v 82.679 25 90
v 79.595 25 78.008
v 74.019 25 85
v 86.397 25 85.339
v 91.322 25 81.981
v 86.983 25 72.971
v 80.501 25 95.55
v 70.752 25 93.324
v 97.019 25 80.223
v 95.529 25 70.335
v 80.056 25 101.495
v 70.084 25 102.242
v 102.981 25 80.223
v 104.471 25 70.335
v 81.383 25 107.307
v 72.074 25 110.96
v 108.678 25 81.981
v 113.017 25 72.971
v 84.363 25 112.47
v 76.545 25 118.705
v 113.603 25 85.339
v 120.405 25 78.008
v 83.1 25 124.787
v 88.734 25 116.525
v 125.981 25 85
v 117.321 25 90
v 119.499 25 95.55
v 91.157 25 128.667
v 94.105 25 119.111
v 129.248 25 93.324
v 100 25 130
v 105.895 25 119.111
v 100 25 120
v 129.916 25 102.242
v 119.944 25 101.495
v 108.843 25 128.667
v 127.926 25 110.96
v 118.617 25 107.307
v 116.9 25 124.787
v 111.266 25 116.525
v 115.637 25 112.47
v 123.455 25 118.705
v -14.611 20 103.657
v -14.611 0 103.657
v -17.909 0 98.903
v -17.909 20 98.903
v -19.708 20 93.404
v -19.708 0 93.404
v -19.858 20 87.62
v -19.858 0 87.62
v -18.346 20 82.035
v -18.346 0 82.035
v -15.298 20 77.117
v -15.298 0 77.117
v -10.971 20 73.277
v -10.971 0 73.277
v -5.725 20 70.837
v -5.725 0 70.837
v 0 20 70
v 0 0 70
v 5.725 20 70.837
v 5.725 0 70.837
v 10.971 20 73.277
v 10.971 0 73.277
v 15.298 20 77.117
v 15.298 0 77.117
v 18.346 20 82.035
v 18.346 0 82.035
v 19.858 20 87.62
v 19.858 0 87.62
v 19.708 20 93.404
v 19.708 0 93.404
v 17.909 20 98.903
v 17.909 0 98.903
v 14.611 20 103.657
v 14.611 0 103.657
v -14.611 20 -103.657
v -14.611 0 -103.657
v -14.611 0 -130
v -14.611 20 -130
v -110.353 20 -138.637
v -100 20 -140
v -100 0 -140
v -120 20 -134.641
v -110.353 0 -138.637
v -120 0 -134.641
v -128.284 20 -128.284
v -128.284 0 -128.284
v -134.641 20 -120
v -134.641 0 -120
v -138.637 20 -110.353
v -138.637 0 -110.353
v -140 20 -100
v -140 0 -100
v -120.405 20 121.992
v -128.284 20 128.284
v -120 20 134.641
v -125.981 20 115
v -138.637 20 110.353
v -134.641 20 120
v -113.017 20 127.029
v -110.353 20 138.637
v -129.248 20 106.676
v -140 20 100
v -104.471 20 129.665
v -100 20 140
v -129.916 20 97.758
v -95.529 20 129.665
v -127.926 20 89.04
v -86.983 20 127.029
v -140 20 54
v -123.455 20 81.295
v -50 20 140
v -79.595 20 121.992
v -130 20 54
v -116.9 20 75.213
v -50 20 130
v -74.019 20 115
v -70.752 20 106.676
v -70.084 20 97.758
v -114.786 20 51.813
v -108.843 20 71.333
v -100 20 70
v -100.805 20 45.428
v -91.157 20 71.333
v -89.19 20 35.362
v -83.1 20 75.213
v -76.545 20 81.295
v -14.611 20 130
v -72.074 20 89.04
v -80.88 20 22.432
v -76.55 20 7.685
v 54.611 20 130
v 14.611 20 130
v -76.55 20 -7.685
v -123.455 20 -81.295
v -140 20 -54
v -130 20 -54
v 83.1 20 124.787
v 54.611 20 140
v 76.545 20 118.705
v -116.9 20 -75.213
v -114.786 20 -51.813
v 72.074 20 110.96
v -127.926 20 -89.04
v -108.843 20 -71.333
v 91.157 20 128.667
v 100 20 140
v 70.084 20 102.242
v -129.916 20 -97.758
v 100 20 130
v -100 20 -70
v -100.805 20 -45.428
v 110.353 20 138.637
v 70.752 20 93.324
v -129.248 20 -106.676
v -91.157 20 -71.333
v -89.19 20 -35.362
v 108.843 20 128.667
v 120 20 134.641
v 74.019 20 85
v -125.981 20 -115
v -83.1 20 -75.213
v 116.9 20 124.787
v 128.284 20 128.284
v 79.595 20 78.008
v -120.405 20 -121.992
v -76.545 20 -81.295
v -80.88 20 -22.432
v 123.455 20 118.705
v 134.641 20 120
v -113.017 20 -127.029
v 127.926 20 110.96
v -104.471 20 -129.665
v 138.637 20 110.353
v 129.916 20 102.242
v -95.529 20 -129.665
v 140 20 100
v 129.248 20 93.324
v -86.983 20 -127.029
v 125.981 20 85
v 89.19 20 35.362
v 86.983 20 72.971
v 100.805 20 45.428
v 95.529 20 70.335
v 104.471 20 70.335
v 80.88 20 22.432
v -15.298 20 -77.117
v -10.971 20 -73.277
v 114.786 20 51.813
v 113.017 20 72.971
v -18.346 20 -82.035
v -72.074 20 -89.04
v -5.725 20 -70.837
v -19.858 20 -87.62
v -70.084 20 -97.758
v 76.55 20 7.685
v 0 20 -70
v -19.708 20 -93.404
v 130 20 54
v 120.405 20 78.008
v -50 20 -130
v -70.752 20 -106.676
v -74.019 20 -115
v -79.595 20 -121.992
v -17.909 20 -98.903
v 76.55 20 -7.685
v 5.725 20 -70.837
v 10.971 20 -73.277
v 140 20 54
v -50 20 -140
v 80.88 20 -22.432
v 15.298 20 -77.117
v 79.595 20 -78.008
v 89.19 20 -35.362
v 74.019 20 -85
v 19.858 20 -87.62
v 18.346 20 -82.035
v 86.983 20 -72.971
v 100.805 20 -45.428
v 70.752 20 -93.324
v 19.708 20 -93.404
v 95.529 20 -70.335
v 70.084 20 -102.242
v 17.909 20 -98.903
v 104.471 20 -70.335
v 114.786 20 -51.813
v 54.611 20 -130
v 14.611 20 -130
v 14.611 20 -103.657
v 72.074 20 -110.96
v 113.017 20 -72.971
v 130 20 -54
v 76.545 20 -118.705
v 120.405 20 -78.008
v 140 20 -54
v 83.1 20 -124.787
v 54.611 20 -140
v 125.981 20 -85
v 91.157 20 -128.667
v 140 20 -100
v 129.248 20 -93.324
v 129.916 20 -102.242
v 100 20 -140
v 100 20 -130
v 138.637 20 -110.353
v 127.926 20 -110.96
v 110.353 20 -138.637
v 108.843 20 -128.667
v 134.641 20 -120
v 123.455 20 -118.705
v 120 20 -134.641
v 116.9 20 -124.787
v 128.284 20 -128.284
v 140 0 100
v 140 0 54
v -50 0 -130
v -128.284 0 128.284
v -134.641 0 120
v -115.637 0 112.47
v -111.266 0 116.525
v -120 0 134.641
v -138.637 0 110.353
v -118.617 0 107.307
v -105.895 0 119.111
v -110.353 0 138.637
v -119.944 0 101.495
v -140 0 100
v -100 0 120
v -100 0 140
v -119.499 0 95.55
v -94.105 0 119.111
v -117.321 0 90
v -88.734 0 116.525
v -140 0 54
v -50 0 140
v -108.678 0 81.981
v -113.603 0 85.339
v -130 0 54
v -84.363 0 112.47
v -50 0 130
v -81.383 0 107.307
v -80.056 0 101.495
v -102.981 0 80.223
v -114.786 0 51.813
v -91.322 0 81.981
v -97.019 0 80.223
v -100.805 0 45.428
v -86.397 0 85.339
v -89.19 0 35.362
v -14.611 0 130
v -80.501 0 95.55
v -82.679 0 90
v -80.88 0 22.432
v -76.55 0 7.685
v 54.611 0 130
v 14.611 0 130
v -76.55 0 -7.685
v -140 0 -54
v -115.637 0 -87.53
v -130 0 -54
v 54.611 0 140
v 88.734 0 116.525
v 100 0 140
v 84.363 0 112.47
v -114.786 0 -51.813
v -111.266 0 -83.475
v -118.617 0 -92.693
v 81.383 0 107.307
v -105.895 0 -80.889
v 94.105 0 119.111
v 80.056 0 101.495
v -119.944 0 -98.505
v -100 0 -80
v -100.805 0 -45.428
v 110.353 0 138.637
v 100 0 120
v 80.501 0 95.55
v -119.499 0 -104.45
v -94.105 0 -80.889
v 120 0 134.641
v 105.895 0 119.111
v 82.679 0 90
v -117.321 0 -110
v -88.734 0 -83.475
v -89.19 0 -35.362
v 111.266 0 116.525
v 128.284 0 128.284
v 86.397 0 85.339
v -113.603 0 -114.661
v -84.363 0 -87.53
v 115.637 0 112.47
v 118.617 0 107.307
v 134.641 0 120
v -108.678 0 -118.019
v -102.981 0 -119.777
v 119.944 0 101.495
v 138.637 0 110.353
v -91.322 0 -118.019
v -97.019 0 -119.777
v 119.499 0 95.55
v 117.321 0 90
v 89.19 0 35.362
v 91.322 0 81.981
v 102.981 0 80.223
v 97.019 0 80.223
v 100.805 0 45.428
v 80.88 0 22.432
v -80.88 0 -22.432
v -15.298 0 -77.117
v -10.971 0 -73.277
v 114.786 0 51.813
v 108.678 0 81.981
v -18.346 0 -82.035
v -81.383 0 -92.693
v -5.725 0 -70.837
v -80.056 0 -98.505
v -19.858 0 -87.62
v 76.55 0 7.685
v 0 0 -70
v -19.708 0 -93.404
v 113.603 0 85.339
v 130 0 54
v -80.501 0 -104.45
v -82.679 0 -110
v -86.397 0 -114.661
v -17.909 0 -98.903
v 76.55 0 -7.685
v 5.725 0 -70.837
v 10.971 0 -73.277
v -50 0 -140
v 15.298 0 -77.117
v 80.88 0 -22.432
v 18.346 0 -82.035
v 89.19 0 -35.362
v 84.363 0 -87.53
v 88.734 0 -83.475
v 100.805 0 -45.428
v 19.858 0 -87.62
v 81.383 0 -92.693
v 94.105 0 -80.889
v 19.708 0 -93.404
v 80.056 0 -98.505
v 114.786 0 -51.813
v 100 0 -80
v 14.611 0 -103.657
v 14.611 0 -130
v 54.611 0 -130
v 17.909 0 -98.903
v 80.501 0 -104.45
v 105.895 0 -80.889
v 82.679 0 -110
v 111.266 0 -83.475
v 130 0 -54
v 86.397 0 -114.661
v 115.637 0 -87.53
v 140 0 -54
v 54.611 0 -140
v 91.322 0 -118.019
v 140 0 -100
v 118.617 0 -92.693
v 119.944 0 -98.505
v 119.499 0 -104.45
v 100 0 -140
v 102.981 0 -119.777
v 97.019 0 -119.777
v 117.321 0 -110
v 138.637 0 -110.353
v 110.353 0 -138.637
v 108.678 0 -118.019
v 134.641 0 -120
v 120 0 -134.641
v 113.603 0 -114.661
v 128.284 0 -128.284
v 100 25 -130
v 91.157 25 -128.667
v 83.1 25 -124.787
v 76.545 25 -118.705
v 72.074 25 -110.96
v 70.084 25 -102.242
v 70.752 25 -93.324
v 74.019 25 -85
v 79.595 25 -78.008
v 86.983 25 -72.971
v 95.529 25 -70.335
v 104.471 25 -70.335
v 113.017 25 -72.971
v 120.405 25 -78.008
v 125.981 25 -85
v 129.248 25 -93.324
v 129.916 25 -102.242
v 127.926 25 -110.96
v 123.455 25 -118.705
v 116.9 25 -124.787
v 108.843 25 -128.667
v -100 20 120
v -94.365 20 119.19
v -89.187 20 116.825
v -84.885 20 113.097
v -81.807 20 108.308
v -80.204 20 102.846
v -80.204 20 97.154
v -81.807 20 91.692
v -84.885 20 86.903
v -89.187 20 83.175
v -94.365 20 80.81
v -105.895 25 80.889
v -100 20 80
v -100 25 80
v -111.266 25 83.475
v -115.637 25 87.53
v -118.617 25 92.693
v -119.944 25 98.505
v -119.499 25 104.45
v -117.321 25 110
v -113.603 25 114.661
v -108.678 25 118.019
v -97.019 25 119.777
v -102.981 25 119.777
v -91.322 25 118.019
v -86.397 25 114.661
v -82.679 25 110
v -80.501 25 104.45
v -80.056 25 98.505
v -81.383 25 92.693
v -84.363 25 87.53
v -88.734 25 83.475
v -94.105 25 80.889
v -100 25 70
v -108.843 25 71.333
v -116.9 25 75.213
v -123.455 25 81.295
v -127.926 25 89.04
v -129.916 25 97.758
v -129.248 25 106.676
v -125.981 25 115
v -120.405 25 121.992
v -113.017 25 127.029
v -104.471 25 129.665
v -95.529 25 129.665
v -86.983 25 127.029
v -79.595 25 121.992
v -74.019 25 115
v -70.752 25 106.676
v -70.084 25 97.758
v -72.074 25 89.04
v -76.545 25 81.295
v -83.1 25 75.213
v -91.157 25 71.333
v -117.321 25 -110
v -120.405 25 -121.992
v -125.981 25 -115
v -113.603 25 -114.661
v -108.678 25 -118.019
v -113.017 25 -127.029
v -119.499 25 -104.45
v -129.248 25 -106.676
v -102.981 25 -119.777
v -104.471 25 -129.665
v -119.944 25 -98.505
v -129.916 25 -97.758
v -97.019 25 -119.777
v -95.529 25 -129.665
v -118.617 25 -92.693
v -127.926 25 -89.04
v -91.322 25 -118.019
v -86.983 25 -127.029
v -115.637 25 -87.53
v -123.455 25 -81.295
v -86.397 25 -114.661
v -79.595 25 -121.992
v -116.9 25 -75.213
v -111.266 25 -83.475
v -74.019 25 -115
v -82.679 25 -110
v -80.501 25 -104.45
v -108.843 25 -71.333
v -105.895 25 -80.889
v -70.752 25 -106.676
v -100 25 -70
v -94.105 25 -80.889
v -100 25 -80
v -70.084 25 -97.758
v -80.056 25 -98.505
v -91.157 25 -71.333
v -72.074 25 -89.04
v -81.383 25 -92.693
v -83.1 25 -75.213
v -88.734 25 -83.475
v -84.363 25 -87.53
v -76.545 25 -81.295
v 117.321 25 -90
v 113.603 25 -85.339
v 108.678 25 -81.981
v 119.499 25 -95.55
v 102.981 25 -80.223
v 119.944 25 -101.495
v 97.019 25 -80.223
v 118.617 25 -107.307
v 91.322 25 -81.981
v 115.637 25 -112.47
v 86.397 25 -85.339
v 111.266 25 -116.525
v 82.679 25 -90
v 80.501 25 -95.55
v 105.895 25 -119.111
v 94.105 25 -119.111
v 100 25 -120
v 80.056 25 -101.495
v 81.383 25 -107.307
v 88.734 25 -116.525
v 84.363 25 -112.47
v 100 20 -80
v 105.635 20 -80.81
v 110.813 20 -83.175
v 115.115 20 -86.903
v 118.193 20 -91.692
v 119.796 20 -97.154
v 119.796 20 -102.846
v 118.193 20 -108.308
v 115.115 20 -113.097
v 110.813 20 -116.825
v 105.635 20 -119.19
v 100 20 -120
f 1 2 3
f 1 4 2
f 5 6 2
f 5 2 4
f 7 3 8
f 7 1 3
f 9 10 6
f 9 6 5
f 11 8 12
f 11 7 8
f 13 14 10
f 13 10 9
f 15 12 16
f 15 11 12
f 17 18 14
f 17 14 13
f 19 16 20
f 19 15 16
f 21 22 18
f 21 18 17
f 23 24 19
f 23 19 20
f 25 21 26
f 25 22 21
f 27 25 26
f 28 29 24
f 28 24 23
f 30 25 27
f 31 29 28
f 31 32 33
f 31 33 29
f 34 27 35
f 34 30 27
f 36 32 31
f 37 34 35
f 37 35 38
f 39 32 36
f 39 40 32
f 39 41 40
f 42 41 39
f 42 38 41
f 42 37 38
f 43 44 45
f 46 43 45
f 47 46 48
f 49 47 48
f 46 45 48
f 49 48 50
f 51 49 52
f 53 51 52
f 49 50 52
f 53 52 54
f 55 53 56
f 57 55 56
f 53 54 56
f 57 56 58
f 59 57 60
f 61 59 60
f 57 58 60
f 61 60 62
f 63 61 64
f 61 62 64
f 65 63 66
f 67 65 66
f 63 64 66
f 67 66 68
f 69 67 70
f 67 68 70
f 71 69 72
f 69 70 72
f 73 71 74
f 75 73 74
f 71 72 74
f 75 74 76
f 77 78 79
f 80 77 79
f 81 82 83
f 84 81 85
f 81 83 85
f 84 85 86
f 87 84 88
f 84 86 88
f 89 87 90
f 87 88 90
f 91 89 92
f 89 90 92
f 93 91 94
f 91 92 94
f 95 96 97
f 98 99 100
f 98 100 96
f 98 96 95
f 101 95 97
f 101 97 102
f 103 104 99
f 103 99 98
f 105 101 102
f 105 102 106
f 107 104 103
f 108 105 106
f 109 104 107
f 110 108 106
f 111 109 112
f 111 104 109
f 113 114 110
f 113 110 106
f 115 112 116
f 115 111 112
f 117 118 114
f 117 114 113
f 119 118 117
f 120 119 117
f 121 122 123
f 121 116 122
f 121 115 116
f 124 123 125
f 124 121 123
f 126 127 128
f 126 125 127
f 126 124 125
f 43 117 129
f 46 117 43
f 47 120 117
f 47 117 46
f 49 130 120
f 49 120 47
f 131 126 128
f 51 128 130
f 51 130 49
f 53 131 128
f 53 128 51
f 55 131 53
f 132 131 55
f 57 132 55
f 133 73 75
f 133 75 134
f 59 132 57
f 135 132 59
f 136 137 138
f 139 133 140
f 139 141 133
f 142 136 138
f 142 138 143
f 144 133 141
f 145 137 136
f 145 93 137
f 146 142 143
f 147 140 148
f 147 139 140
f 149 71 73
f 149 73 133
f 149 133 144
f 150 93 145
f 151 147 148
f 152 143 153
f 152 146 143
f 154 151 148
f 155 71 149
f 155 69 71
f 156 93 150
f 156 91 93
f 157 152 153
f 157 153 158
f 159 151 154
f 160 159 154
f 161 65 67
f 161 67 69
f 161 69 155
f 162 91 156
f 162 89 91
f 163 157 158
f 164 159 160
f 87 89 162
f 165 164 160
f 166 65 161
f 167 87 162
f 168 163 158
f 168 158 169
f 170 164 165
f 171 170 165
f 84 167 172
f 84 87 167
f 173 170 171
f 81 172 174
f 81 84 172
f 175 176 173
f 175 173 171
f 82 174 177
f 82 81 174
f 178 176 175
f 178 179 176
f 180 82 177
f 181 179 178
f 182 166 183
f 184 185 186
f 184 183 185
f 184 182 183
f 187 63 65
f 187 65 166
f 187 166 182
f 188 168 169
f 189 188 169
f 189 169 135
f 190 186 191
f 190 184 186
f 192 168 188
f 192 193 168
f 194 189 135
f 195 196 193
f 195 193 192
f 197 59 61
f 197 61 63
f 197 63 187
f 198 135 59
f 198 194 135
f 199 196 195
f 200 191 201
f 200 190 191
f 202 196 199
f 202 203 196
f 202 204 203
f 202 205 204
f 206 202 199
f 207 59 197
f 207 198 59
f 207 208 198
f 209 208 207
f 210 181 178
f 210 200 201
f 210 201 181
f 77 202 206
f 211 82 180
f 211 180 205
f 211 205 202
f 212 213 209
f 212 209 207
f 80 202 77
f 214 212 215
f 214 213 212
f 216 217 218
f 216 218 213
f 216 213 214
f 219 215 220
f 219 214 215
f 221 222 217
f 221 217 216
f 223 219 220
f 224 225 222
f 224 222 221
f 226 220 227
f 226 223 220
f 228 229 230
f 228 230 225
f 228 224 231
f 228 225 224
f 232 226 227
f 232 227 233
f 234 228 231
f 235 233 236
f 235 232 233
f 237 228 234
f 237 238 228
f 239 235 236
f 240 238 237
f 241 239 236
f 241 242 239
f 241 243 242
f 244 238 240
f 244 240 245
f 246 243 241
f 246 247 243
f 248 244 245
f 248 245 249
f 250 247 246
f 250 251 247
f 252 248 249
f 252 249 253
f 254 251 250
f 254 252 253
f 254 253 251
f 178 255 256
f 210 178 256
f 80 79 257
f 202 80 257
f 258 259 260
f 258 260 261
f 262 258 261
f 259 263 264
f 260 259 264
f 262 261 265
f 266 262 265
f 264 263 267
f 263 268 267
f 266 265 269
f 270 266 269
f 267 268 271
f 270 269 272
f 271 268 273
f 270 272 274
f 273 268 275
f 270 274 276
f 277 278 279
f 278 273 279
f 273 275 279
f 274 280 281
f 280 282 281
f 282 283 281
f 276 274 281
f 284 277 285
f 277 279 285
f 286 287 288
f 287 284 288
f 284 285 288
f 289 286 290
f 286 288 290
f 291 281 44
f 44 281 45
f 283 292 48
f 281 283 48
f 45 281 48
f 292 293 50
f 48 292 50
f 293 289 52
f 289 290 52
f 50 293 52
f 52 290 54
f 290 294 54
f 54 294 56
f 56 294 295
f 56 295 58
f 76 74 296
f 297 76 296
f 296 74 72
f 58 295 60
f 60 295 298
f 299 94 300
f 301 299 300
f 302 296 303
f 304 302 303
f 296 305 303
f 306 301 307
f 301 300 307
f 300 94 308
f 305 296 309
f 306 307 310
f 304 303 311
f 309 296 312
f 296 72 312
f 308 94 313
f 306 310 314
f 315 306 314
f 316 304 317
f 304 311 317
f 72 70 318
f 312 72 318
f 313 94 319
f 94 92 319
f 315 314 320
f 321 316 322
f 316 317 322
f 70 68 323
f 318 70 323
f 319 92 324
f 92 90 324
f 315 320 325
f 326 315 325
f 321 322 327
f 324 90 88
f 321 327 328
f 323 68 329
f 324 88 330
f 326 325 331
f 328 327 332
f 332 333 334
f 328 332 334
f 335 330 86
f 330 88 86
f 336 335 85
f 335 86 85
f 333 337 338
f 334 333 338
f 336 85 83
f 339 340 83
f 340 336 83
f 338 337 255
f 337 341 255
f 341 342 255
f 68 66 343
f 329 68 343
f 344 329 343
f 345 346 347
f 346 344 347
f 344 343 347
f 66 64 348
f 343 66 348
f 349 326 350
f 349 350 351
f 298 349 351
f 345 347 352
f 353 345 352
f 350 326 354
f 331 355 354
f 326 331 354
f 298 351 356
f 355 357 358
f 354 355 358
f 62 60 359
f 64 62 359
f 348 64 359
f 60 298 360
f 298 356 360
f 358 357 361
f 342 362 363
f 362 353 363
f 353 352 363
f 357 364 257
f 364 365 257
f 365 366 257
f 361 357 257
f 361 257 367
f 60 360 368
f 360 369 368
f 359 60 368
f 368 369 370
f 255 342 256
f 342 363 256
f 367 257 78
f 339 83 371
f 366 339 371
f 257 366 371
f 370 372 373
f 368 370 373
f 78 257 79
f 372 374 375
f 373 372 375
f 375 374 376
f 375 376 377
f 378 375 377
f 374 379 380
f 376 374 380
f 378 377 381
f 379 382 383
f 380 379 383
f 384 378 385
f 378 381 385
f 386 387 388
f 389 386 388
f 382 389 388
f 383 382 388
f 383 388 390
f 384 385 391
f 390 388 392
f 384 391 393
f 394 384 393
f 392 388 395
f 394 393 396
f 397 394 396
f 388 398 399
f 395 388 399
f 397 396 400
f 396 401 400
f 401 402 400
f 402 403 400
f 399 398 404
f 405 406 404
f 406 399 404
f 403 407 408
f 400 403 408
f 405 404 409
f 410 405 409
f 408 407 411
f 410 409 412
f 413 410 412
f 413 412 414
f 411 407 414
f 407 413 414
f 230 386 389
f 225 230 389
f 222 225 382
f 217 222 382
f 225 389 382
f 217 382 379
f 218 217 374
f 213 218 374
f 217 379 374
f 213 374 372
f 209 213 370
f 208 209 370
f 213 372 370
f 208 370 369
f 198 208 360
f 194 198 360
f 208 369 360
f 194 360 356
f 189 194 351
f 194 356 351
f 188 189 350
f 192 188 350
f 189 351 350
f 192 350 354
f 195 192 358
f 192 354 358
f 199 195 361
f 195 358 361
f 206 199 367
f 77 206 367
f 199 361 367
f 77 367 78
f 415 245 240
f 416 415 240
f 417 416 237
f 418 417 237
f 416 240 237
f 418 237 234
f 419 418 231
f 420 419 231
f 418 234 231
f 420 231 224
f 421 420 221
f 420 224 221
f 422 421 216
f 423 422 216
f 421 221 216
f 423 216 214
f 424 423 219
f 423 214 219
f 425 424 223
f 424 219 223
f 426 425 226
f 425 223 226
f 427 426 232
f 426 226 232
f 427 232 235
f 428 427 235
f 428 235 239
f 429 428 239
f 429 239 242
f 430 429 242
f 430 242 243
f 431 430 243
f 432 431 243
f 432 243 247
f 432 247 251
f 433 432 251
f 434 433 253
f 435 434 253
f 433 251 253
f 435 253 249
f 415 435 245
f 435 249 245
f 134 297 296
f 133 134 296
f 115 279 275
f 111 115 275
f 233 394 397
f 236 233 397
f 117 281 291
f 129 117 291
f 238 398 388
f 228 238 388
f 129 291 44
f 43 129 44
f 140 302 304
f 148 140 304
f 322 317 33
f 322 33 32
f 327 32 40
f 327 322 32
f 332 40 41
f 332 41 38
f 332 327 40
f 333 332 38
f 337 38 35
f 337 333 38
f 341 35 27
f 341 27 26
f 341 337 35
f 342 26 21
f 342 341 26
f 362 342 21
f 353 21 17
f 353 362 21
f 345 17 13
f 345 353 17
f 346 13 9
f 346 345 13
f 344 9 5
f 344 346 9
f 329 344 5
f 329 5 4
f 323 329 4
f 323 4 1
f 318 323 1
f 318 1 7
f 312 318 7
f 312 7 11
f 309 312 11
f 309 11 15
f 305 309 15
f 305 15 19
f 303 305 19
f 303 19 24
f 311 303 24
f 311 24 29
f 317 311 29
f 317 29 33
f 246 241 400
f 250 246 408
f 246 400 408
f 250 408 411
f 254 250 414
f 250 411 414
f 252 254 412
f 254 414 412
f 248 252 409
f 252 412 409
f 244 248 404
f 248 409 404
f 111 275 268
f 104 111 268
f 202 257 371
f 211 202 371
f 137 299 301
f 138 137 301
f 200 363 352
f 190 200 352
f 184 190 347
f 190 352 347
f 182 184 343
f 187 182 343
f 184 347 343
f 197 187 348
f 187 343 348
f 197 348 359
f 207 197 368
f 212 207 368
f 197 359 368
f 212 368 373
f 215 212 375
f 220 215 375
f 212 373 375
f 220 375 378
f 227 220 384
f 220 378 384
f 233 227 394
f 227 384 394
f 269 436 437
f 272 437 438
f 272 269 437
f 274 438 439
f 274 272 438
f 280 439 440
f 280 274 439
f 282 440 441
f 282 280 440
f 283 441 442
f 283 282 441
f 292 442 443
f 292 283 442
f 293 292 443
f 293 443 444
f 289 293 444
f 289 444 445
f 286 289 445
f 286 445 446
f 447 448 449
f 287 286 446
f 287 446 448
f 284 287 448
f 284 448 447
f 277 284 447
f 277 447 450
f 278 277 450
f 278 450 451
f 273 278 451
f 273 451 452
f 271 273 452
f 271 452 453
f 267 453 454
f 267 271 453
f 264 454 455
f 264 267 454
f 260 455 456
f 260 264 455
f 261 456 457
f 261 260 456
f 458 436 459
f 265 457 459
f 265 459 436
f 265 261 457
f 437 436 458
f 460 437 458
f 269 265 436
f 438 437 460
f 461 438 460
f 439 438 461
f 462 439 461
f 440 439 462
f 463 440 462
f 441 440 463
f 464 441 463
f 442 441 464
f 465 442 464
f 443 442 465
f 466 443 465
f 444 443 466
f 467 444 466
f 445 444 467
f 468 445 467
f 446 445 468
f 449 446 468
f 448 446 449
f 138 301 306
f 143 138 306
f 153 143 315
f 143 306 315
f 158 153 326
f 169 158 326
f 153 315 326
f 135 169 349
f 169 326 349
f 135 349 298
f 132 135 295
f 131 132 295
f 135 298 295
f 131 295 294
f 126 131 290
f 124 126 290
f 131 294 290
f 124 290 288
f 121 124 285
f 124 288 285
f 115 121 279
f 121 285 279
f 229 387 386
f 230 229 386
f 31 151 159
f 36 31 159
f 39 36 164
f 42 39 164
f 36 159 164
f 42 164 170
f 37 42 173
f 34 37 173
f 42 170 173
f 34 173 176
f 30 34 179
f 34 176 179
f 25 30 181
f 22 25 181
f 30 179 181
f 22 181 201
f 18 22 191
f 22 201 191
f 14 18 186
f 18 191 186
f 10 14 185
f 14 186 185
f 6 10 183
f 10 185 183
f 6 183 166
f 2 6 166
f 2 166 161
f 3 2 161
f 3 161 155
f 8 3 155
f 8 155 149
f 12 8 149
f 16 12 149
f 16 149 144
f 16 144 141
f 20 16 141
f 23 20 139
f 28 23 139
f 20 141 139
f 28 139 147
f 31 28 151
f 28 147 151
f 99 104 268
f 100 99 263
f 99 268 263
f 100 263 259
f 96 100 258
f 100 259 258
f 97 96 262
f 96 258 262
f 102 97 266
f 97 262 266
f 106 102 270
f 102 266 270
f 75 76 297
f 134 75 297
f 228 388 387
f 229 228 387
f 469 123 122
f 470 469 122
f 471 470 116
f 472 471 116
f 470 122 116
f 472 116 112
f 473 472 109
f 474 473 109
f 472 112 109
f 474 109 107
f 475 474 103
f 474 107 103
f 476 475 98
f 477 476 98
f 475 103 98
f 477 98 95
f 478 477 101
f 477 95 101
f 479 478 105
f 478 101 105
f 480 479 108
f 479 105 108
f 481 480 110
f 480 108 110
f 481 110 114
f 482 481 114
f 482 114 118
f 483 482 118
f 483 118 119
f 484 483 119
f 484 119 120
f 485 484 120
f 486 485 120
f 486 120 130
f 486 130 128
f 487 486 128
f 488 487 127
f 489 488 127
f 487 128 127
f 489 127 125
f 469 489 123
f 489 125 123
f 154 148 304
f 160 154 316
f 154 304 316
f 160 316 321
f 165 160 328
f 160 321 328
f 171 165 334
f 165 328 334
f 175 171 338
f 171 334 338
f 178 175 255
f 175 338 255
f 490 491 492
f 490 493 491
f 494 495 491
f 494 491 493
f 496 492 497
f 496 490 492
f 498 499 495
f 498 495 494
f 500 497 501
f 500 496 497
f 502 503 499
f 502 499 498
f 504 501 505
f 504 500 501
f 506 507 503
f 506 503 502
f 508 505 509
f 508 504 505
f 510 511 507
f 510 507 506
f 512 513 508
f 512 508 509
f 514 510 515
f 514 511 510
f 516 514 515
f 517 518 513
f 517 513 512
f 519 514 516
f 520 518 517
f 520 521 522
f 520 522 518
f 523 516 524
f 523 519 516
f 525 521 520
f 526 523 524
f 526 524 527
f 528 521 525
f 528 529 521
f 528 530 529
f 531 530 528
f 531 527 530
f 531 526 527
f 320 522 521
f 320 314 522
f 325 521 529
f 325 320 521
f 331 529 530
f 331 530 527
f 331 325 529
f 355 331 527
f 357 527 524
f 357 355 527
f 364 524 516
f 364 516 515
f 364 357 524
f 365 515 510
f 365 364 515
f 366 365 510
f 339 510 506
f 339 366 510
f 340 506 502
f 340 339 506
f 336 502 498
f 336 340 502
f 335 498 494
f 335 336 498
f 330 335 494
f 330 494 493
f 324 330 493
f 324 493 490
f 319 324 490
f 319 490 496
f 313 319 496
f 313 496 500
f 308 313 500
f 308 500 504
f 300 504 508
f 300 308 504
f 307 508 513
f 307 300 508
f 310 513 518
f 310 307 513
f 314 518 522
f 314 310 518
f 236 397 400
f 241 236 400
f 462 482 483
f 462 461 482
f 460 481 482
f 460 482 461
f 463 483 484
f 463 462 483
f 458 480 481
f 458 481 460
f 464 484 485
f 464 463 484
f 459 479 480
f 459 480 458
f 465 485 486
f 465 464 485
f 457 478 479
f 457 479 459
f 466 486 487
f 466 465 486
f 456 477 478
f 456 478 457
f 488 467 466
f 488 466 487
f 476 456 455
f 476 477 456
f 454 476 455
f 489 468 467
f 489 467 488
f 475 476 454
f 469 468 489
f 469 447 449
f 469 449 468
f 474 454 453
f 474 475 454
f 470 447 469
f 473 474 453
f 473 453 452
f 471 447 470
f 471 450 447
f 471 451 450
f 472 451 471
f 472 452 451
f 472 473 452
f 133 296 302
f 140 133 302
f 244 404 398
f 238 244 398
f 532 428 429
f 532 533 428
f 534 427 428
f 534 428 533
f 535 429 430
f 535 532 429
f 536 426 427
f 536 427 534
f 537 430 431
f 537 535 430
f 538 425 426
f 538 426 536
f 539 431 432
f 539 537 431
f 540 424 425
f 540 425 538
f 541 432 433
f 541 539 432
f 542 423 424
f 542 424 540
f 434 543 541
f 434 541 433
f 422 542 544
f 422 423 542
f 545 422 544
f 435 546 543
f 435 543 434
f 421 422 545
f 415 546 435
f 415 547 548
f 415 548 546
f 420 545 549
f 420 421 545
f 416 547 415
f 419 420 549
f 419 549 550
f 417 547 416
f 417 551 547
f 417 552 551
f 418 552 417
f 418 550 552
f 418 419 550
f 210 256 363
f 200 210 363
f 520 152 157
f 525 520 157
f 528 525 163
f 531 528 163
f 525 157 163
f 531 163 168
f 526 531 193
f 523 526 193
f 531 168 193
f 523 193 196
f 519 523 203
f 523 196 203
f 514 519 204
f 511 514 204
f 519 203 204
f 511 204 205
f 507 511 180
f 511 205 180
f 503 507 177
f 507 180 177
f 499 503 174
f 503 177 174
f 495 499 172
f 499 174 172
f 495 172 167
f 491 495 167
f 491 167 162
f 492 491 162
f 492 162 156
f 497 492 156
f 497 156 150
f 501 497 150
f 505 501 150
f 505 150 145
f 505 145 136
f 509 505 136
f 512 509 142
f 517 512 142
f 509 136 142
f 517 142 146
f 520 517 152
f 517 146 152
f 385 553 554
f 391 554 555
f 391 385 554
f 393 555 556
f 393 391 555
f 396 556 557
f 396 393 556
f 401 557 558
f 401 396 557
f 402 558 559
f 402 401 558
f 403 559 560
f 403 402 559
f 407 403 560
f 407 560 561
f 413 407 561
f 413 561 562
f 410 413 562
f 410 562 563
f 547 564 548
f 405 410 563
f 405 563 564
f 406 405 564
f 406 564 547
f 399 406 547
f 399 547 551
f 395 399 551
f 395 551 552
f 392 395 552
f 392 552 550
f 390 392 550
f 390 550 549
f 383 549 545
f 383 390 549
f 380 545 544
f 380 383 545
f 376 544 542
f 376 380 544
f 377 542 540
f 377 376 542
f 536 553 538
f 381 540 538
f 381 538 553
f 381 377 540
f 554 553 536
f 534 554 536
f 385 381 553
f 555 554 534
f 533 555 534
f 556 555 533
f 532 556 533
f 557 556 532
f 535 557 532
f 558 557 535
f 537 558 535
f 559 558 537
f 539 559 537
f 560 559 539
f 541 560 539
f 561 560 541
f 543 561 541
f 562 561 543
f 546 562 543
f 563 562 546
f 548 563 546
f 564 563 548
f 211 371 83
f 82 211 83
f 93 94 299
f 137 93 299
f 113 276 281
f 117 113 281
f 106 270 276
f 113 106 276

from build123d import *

# Parameters (mm, degrees)
SKETCH2_R           = 20
BOSS_EXTRUDE1_DEPTH = 20
SKETCH3_R           = 30
SKETCH3_R_2         = 20
BOSS_EXTRUDE2_DEPTH = 5


with BuildPart() as part:
    # Sketch2 → Boss-Extrude1 (new body)
    with BuildSketch(Plane(origin=(0, 0, 0), x_dir=(1, 0, 0), z_dir=(0, 1, 0))):
        with BuildLine():
            Line((-14.611492378, -130), (-14.611492378, -103.656657369))
            ThreePointArc((-14.611492378, -103.656657369), (0, -70), (14.611492378, -103.656657369))
            Line((14.611492378, -103.656657369), (14.611492378, -130))
            Line((14.611492378, -130), (54.611492378, -130))
            Line((54.611492378, -130), (54.611492378, -140))
            Line((54.611492378, -140), (100, -140))
            ThreePointArc((100, -140), (128.284271247, -128.284271247), (140, -100))
            Line((140, -100), (140, -54))
            Line((140, -54), (130, -54))
            ThreePointArc((130, -54), (76, 0), (130, 54))
            Line((130, 54), (140, 54))
            Line((140, 54), (140, 100))
            ThreePointArc((140, 100), (128.284271247, 128.284271247), (100, 140))
            Line((100, 140), (54.611492378, 140))
            Line((54.611492378, 140), (54.611492378, 130))
            Line((54.611492378, 130), (14.611492378, 130))
            Line((14.611492378, 130), (14.611492378, 103.656657369))
            ThreePointArc((14.611492378, 103.656657369), (0, 70), (-14.611492378, 103.656657369))
            Line((-14.611492378, 103.656657369), (-14.611492378, 130))
            Line((-14.611492378, 130), (-50, 130))
            Line((-50, 130), (-50, 140))
            Line((-50, 140), (-100, 140))
            ThreePointArc((-100, 140), (-128.284271247, 128.284271247), (-140, 100))
            Line((-140, 100), (-140, 54))
            Line((-140, 54), (-130, 54))
            ThreePointArc((-130, 54), (-76, 0), (-130, -54))
            Line((-130, -54), (-140, -54))
            Line((-140, -54), (-140, -100))
            ThreePointArc((-140, -100), (-128.284271247, -128.284271247), (-100, -140))
            Line((-100, -140), (-50, -140))
            Line((-50, -140), (-50, -130))
            Line((-50, -130), (-14.611492378, -130))
        make_face()
        with Locations(Location((-100, -100, 0), (0, 0, 270))):
            Circle(SKETCH2_R, mode=Mode.SUBTRACT)
        with Locations(Location((-100, 100, 0), (0, 0, 270))):
            Circle(SKETCH2_R, mode=Mode.SUBTRACT)
        with Locations(Location((100, 100, 0), (0, 0, 270))):
            Circle(SKETCH2_R, mode=Mode.SUBTRACT)
        with Locations(Location((100, -100, 0), (0, 0, 270))):
            Circle(SKETCH2_R, mode=Mode.SUBTRACT)
    extrude(amount=BOSS_EXTRUDE1_DEPTH)

    # Sketch3 → Boss-Extrude2 (add)
    # profile 1 of 4: a face of its own
    with BuildSketch(Plane(origin=(0, 20, 0), x_dir=(1, 0, 0), z_dir=(0, 1, 0))):
        with Locations(Location((-100, 100, 0), (0, 0, 270))):
            Circle(SKETCH3_R)
        with Locations(Location((-100, 100, 0), (0, 0, 270))):
            Circle(SKETCH3_R_2, mode=Mode.SUBTRACT)
    # profile 2 of 4: a face of its own
    with BuildSketch(Plane(origin=(0, 20, 0), x_dir=(1, 0, 0), z_dir=(0, 1, 0))):
        with Locations(Location((100, 100, 0), (0, 0, 90))):
            Circle(SKETCH3_R)
        with Locations(Location((100, 100, 0), (0, 0, 90))):
            Circle(SKETCH3_R_2, mode=Mode.SUBTRACT)
    # profile 3 of 4: a face of its own
    with BuildSketch(Plane(origin=(0, 20, 0), x_dir=(1, 0, 0), z_dir=(0, 1, 0))):
        with Locations(Location((100, -100, 0), (0, 0, 270))):
            Circle(SKETCH3_R)
        with Locations(Location((100, -100, 0), (0, 0, 270))):
            Circle(SKETCH3_R_2, mode=Mode.SUBTRACT)
    # profile 4 of 4: a face of its own
    with BuildSketch(Plane(origin=(0, 20, 0), x_dir=(1, 0, 0), z_dir=(0, 1, 0))):
        with Locations(Location((-100, -100, 0), (0, 0, 90))):
            Circle(SKETCH3_R)
        with Locations(Location((-100, -100, 0), (0, 0, 90))):
            Circle(SKETCH3_R_2, mode=Mode.SUBTRACT)
    extrude(amount=BOSS_EXTRUDE2_DEPTH)


solid = part.part
